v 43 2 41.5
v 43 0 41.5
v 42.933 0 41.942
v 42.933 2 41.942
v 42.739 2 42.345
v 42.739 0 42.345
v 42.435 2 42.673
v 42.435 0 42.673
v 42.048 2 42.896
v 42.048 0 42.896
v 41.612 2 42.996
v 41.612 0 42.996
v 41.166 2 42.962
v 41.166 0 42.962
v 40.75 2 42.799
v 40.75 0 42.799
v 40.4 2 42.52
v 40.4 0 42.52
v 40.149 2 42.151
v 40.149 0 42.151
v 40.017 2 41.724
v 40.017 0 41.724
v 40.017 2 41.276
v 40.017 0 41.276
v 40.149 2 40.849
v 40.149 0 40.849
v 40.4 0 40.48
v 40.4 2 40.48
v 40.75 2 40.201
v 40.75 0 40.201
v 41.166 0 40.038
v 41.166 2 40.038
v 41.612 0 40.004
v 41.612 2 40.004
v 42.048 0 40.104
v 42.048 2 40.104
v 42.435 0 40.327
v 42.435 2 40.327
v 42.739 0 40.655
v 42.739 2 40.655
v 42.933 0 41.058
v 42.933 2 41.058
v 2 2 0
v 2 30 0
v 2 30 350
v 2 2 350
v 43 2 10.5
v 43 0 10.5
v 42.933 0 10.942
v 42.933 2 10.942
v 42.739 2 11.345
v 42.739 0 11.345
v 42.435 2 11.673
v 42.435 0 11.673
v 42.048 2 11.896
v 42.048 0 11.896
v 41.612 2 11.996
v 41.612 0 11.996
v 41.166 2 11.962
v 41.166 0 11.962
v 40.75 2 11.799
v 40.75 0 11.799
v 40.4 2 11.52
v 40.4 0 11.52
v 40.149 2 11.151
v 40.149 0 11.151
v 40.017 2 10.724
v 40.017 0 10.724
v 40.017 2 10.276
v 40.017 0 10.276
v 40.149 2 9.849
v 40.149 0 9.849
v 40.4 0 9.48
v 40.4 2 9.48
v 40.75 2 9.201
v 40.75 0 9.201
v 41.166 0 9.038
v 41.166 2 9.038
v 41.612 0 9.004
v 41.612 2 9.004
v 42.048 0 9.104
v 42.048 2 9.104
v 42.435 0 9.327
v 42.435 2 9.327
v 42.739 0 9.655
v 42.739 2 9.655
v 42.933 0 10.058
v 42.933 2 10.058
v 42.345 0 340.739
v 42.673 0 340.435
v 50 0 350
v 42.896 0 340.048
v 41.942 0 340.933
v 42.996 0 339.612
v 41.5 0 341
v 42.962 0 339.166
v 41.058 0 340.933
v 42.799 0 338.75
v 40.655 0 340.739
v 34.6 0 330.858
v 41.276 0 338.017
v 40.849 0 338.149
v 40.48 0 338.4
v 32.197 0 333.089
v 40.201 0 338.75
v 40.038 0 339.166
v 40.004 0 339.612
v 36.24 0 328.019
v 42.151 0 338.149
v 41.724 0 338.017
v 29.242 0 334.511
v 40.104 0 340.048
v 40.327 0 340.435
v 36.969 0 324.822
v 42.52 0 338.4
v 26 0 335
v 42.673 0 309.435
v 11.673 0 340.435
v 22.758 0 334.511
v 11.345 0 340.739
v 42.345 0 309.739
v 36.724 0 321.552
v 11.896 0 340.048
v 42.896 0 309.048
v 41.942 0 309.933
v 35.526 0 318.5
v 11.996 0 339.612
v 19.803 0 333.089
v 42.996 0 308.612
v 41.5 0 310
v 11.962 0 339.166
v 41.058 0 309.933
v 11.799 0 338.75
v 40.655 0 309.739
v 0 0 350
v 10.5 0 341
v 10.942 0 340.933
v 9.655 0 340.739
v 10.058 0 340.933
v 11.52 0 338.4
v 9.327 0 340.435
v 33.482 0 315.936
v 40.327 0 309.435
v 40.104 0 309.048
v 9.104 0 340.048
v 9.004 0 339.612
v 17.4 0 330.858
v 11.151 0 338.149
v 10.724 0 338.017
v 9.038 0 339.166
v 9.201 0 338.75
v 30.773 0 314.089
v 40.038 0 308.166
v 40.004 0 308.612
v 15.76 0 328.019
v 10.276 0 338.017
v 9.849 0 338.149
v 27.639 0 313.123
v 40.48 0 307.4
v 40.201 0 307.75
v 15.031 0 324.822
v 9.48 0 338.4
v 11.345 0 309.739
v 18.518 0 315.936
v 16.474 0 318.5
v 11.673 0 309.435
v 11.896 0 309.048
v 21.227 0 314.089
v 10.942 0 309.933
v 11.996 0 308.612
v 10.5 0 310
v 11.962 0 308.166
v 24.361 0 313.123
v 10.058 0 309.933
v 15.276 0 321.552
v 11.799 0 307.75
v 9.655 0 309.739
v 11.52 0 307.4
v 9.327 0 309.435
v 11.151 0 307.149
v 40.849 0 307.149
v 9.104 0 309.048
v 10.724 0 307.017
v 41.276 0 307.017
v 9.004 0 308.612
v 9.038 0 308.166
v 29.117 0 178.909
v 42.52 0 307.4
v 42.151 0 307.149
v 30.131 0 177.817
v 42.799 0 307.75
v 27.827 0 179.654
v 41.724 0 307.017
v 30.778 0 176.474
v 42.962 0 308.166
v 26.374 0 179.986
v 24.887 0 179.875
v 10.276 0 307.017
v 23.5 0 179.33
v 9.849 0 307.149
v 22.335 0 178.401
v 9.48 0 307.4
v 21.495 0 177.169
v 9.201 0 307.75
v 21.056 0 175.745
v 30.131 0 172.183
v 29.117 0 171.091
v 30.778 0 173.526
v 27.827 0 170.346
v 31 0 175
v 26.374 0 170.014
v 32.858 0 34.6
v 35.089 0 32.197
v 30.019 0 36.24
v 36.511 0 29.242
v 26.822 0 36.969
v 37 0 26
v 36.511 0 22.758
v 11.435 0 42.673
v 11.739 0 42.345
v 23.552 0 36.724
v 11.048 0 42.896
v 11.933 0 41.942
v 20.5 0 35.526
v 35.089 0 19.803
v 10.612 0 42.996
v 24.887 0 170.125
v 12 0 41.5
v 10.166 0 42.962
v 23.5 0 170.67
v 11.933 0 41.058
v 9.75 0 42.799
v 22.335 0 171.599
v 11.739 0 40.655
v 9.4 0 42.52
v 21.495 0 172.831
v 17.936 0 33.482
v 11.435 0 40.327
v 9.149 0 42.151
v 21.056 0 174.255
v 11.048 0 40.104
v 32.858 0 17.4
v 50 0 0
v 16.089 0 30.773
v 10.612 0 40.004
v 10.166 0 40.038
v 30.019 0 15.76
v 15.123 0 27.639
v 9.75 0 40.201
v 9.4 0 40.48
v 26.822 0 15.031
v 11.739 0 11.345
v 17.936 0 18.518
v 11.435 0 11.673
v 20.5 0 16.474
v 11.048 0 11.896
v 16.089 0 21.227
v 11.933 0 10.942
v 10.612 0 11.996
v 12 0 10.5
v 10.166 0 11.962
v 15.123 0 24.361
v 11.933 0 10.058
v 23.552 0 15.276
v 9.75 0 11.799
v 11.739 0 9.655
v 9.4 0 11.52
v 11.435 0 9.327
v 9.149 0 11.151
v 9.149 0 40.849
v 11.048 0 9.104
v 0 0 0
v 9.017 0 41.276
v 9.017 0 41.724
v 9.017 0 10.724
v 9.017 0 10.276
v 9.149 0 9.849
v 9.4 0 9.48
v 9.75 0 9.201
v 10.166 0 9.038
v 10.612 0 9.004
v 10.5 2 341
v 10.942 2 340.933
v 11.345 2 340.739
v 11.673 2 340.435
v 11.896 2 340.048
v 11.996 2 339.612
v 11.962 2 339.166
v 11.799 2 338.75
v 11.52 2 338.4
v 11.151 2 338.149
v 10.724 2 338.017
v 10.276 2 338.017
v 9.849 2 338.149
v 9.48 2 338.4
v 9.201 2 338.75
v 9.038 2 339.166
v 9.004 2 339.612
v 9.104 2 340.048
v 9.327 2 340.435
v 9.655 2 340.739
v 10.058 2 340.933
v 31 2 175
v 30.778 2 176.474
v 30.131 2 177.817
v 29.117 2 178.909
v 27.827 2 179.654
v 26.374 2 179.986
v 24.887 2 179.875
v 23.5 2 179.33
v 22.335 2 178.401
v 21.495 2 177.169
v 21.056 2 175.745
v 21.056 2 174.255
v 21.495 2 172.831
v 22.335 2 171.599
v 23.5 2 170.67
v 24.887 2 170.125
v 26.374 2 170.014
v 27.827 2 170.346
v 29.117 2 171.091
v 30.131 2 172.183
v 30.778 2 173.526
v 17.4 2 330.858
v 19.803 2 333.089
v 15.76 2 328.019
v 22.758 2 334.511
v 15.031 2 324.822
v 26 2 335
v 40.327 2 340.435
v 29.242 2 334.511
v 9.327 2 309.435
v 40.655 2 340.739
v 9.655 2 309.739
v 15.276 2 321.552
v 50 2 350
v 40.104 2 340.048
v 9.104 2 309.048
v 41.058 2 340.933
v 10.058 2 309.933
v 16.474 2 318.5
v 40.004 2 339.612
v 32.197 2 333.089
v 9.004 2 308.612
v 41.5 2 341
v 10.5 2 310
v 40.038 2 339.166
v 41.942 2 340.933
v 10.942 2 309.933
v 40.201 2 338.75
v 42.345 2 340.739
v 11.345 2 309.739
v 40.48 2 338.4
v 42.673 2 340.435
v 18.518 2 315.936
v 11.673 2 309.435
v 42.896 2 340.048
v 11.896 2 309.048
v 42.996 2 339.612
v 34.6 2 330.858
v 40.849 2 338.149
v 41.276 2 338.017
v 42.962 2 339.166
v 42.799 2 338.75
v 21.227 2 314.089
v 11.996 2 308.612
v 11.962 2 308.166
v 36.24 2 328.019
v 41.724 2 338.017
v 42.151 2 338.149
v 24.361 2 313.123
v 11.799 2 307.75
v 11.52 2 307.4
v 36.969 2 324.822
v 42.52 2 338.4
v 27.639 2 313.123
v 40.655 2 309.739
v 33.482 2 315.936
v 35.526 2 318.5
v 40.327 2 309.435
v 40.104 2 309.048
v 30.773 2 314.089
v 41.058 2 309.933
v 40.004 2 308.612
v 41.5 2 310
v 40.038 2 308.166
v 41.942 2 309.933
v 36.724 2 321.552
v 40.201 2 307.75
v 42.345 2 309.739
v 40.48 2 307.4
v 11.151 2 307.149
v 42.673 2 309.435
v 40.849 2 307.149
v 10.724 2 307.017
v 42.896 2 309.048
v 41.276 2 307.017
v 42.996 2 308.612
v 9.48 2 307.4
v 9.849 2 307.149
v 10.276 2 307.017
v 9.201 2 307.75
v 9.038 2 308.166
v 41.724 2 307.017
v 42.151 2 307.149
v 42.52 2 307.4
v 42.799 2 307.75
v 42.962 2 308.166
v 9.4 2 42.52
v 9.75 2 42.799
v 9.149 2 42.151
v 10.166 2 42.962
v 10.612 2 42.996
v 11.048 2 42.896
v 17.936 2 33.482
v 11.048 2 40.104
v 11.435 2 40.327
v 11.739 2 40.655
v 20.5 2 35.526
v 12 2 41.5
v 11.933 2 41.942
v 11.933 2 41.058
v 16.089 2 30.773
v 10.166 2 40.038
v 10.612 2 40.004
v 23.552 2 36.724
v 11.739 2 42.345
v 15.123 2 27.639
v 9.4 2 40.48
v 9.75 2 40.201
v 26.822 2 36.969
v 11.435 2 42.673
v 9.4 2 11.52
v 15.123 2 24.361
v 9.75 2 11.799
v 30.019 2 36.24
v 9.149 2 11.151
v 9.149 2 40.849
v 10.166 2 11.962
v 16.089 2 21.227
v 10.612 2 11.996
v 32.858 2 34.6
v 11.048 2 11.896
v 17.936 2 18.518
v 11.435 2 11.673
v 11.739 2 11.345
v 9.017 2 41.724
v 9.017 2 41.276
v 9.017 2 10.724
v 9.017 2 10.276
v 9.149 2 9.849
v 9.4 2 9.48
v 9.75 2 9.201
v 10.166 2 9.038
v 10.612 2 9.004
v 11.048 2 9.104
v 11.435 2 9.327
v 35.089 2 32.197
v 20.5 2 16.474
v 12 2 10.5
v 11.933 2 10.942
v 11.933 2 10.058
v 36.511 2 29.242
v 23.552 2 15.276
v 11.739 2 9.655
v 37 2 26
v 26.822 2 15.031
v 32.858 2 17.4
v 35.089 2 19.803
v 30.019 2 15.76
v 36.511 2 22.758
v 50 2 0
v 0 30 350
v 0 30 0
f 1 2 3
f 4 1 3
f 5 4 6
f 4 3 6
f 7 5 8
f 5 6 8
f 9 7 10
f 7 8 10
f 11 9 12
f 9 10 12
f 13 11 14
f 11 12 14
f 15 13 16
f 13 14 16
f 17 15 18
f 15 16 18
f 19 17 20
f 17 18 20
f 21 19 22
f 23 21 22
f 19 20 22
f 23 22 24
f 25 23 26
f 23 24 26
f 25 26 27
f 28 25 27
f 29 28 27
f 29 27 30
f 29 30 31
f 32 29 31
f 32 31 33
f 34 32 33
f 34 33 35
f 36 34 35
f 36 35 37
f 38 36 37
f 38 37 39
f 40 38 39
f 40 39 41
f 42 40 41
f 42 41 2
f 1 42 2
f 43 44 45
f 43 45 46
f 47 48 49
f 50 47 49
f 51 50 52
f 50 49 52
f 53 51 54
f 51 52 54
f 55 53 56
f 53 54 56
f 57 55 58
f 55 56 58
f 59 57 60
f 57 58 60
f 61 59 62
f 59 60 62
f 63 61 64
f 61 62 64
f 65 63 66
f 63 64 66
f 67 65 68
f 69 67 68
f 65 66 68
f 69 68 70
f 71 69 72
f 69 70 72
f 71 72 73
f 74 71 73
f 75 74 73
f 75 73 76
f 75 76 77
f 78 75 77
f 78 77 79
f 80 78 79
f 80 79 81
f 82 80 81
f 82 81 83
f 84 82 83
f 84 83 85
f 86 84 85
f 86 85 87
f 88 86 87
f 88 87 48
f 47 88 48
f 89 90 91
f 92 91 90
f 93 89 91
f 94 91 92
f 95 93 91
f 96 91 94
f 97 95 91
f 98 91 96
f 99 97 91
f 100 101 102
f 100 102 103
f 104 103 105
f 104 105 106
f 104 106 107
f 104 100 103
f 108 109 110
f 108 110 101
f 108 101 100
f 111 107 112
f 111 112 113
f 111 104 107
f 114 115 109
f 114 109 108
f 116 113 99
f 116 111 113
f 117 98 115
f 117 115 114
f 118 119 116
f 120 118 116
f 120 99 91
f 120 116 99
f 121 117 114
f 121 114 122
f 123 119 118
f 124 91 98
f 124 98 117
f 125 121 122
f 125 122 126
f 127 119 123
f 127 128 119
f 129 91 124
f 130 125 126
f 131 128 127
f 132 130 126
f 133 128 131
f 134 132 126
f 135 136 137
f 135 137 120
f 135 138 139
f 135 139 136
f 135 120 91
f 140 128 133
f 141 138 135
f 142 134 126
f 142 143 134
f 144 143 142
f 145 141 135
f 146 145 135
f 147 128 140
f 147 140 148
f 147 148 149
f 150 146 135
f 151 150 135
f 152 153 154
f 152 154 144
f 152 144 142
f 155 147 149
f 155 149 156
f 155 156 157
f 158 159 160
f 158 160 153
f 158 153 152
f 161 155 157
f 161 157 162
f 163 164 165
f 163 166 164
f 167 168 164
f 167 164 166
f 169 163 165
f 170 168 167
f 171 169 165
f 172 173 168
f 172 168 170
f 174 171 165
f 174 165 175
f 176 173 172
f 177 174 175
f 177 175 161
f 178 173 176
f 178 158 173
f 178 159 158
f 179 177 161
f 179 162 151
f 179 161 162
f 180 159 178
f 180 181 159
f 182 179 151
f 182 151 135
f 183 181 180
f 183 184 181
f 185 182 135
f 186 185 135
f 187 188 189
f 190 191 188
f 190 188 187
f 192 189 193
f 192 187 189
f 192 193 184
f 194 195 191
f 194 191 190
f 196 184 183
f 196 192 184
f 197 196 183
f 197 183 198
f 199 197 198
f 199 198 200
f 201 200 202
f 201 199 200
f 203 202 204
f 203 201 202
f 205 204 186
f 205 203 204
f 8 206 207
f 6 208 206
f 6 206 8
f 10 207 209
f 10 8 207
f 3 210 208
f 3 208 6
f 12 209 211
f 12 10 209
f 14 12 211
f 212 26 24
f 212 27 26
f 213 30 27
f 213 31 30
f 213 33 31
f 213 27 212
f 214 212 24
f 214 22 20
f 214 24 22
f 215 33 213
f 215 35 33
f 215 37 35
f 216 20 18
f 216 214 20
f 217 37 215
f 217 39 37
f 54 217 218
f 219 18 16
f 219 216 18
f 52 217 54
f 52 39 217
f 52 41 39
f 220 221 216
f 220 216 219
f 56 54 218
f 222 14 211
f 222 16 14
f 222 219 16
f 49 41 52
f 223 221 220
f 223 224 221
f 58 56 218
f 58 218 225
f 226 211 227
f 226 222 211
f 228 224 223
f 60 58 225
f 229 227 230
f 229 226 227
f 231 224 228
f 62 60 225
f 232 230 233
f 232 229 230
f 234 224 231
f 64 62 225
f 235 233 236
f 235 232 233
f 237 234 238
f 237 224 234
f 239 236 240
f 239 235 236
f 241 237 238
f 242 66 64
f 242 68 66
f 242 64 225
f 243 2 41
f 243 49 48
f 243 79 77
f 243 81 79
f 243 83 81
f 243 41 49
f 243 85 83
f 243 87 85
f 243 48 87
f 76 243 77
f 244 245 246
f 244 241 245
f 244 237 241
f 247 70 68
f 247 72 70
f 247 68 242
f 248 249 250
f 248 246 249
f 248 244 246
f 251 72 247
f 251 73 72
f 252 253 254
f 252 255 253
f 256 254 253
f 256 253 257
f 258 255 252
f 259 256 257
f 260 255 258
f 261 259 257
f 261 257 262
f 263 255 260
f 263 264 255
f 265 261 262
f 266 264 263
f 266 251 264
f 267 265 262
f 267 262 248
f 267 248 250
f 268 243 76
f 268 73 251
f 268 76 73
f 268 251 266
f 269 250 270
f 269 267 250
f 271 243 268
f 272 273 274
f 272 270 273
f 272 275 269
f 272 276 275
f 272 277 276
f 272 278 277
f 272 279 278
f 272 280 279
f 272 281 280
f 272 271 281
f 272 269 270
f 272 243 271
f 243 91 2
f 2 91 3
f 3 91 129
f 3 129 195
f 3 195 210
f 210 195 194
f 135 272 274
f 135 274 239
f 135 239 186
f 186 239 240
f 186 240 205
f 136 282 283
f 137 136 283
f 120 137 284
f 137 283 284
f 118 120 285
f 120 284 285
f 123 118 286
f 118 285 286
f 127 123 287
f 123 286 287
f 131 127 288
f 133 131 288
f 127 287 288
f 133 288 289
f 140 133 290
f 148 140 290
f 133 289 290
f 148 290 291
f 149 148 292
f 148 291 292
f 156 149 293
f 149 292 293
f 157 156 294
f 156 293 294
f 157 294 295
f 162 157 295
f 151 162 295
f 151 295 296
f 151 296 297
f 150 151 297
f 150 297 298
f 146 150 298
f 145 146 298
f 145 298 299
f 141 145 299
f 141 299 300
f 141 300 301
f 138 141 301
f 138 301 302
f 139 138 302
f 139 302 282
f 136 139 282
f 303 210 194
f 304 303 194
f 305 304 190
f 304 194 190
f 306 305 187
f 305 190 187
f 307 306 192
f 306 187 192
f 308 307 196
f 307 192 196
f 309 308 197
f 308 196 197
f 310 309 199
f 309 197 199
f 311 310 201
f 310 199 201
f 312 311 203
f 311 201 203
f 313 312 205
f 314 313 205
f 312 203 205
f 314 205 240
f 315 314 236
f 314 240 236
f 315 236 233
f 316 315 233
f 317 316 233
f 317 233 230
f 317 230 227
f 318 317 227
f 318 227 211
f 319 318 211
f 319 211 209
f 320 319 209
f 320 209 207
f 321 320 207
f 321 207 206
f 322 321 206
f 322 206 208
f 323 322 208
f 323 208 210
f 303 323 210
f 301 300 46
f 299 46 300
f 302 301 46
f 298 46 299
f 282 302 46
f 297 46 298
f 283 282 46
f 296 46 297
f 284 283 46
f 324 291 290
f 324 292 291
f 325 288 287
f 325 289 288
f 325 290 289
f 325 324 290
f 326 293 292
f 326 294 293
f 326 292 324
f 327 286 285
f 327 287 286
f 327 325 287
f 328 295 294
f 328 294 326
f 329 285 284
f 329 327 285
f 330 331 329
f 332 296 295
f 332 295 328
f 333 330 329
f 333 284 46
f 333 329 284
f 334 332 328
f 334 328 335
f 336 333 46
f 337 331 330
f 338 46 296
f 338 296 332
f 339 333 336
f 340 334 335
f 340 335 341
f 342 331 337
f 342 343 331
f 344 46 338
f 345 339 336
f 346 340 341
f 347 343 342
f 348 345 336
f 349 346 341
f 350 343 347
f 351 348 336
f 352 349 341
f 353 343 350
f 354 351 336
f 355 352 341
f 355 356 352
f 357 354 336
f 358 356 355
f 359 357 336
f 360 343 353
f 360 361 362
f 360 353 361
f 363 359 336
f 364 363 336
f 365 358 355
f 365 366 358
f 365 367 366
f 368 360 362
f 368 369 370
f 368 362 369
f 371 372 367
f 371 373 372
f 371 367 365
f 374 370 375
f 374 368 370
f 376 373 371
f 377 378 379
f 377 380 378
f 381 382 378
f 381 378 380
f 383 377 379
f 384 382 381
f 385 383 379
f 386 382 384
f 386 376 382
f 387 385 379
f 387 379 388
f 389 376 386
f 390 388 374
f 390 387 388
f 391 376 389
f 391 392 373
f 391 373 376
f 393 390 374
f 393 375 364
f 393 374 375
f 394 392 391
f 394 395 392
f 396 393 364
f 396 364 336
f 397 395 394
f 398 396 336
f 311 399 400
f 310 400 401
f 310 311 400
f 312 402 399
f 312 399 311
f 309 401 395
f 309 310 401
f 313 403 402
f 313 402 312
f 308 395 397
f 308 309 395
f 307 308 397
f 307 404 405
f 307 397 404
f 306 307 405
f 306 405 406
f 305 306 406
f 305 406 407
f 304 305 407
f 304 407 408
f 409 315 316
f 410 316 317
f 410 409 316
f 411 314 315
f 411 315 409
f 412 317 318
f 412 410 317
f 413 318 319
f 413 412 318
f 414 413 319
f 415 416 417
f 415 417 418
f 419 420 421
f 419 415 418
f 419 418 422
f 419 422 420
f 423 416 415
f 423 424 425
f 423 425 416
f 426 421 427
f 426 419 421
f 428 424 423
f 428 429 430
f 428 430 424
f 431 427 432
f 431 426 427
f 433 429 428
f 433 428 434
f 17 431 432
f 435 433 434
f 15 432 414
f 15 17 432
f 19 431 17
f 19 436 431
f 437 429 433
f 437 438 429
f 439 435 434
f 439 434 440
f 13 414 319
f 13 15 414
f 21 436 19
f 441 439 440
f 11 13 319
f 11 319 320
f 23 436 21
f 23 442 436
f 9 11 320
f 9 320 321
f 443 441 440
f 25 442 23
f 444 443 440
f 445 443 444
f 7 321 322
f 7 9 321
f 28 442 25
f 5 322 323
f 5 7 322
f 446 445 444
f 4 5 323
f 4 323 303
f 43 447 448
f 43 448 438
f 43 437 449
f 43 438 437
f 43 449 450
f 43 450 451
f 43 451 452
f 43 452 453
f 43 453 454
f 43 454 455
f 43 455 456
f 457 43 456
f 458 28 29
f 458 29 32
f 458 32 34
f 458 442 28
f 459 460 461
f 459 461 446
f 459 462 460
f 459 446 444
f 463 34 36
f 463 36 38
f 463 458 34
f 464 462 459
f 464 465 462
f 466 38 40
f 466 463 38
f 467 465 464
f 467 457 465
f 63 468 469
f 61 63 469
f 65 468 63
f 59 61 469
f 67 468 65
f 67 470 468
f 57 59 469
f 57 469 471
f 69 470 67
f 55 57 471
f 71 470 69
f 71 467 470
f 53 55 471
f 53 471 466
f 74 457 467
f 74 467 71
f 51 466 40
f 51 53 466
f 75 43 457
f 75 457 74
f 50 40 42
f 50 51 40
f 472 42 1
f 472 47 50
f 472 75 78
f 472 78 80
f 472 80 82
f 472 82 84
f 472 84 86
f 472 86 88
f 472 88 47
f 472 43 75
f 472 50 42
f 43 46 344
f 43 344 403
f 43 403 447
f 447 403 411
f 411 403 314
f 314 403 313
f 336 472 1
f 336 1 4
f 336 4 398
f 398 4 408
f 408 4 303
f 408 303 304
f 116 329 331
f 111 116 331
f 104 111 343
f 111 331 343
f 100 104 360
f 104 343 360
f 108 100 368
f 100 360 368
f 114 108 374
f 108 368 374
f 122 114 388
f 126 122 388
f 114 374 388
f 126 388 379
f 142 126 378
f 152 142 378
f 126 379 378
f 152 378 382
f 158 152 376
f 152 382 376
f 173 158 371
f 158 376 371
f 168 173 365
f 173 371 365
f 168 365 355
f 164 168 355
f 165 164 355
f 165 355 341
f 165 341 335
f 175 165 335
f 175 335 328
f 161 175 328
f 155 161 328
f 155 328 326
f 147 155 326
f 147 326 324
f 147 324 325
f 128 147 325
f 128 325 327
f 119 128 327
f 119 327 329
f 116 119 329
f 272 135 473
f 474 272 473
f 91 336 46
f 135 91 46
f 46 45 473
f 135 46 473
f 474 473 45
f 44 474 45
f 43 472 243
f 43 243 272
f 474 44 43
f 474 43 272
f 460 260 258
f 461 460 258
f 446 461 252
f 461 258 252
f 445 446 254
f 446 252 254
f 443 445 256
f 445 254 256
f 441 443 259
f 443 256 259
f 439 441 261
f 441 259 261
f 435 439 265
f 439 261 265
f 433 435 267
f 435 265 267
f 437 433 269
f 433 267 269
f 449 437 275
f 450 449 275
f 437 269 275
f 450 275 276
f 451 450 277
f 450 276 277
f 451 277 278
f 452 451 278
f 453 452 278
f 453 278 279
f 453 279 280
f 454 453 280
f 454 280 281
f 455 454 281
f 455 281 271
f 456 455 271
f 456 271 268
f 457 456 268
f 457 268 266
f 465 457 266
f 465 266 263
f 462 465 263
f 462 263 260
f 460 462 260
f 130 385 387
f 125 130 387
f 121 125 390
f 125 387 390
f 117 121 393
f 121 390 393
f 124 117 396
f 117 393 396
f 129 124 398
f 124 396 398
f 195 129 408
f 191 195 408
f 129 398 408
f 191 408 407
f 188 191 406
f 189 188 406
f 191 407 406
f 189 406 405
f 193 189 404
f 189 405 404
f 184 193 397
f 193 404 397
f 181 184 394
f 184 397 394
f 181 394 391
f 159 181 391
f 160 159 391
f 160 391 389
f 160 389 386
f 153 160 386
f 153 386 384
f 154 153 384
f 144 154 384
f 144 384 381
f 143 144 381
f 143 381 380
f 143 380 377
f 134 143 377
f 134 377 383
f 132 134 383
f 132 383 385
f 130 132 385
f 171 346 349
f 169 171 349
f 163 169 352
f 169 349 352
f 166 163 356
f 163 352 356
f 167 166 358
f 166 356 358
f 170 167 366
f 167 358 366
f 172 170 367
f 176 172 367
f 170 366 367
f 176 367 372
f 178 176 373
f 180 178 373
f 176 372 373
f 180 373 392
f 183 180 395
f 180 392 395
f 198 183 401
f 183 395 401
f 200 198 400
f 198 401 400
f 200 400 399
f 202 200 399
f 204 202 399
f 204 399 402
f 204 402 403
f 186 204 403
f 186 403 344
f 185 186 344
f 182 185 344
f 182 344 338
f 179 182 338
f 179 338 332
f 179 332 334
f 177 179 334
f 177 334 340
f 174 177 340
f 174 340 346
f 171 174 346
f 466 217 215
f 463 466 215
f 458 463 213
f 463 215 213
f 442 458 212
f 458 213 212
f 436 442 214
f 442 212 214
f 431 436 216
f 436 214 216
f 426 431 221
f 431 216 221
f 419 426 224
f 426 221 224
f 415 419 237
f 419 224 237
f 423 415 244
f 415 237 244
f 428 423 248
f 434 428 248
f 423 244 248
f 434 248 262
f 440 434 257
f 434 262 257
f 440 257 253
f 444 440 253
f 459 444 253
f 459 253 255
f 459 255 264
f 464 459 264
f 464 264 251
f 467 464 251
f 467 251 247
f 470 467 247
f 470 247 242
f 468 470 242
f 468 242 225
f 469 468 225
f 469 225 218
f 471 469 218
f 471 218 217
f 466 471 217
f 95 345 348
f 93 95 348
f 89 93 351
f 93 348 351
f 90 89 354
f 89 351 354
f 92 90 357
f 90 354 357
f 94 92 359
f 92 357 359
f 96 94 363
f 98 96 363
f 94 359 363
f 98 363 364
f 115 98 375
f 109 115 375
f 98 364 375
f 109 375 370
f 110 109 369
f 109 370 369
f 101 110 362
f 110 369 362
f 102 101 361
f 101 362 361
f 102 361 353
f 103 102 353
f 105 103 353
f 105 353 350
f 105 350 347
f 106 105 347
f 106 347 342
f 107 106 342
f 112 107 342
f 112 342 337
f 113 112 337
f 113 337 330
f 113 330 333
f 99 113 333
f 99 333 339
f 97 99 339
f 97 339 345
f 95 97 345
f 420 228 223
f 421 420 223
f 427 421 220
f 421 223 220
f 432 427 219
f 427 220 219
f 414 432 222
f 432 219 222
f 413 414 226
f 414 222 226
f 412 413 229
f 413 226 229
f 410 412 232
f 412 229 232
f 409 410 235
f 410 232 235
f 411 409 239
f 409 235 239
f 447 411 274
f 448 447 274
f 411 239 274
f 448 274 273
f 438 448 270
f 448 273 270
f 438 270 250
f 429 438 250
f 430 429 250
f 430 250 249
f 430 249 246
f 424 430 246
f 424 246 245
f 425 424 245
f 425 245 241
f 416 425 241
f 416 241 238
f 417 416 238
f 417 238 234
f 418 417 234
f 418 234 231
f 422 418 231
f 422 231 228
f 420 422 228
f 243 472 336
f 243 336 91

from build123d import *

# Parameters (mm, degrees)
BOSS_EXTRUDE1_DEPTH = 350
SKETCH6_R           = 1.5
CUT_EXTRUDE3_DEPTH  = 355.660400947
SKETCH7_R           = 11
CUT_EXTRUDE4_DEPTH  = 355.660400947
SKETCH8_R           = 11
CUT_EXTRUDE5_DEPTH  = 355.823899984
SKETCH9_R           = 1.5
CUT_EXTRUDE6_DEPTH  = 355.823899984
SKETCH10_R          = 5
CUT_EXTRUDE7_DEPTH  = 355.823899984


with BuildPart() as part:
    # Sketch1 → Boss-Extrude1 (new body)
    with BuildSketch(Plane.XY):
        Polygon((0, 0), (0, 30), (2, 30), (2, 2), (50, 2), (50, 0), align=None)
    extrude(amount=BOSS_EXTRUDE1_DEPTH)

    # Sketch6 → Cut-Extrude3 (cut, through all)
    with BuildSketch(Plane(origin=(0, 2, 0), x_dir=(1, 0, 0), z_dir=(0, 1, 0))):
        with Locations(Location((41.5, -339.5, 0), (0, 0, 270))):
            Circle(SKETCH6_R)
        with Locations(Location((10.5, -308.5, 0), (0, 0, 270))):
            Circle(SKETCH6_R)
        with Locations(Location((10.5, -339.5, 0), (0, 0, 270))):
            Circle(SKETCH6_R)
        with Locations(Location((41.5, -308.5, 0), (0, 0, 270))):
            Circle(SKETCH6_R)
    extrude(amount=-CUT_EXTRUDE3_DEPTH, mode=Mode.SUBTRACT)

    # Sketch7 → Cut-Extrude4 (cut, through all)
    with BuildSketch(Plane(origin=(0, 2, 0), x_dir=(1, 0, 0), z_dir=(0, 1, 0))):
        with Locations(Location((26, -324, 0), (0, 0, 270))):
            Circle(SKETCH7_R)
    extrude(amount=-CUT_EXTRUDE4_DEPTH, mode=Mode.SUBTRACT)

    # Sketch8 → Cut-Extrude5 (cut, through all)
    with BuildSketch(Plane(origin=(0, 0, 0), x_dir=(-1, 0, 0), z_dir=(0, -1, 0))):
        with Locations(Location((-26, -26, 0), (0, 0, 180))):
            Circle(SKETCH8_R)
    extrude(amount=-CUT_EXTRUDE5_DEPTH, mode=Mode.SUBTRACT)

    # Sketch9 → Cut-Extrude6 (cut, through all)
    with BuildSketch(Plane.XZ):
        with Locations((41.5, 41.5)):
            Circle(SKETCH9_R)
        with Locations((10.5, 41.5)):
            Circle(SKETCH9_R)
        with Locations((10.5, 10.5)):
            Circle(SKETCH9_R)
        with Locations((41.5, 10.5)):
            Circle(SKETCH9_R)
    extrude(amount=-CUT_EXTRUDE6_DEPTH, mode=Mode.SUBTRACT)

    # Sketch10 → Cut-Extrude7 (cut, through all)
    with BuildSketch(Plane.XZ):
        with Locations((26.000000572, 175)):
            Circle(SKETCH10_R)
    extrude(amount=-CUT_EXTRUDE7_DEPTH, mode=Mode.SUBTRACT)


solid = part.part
